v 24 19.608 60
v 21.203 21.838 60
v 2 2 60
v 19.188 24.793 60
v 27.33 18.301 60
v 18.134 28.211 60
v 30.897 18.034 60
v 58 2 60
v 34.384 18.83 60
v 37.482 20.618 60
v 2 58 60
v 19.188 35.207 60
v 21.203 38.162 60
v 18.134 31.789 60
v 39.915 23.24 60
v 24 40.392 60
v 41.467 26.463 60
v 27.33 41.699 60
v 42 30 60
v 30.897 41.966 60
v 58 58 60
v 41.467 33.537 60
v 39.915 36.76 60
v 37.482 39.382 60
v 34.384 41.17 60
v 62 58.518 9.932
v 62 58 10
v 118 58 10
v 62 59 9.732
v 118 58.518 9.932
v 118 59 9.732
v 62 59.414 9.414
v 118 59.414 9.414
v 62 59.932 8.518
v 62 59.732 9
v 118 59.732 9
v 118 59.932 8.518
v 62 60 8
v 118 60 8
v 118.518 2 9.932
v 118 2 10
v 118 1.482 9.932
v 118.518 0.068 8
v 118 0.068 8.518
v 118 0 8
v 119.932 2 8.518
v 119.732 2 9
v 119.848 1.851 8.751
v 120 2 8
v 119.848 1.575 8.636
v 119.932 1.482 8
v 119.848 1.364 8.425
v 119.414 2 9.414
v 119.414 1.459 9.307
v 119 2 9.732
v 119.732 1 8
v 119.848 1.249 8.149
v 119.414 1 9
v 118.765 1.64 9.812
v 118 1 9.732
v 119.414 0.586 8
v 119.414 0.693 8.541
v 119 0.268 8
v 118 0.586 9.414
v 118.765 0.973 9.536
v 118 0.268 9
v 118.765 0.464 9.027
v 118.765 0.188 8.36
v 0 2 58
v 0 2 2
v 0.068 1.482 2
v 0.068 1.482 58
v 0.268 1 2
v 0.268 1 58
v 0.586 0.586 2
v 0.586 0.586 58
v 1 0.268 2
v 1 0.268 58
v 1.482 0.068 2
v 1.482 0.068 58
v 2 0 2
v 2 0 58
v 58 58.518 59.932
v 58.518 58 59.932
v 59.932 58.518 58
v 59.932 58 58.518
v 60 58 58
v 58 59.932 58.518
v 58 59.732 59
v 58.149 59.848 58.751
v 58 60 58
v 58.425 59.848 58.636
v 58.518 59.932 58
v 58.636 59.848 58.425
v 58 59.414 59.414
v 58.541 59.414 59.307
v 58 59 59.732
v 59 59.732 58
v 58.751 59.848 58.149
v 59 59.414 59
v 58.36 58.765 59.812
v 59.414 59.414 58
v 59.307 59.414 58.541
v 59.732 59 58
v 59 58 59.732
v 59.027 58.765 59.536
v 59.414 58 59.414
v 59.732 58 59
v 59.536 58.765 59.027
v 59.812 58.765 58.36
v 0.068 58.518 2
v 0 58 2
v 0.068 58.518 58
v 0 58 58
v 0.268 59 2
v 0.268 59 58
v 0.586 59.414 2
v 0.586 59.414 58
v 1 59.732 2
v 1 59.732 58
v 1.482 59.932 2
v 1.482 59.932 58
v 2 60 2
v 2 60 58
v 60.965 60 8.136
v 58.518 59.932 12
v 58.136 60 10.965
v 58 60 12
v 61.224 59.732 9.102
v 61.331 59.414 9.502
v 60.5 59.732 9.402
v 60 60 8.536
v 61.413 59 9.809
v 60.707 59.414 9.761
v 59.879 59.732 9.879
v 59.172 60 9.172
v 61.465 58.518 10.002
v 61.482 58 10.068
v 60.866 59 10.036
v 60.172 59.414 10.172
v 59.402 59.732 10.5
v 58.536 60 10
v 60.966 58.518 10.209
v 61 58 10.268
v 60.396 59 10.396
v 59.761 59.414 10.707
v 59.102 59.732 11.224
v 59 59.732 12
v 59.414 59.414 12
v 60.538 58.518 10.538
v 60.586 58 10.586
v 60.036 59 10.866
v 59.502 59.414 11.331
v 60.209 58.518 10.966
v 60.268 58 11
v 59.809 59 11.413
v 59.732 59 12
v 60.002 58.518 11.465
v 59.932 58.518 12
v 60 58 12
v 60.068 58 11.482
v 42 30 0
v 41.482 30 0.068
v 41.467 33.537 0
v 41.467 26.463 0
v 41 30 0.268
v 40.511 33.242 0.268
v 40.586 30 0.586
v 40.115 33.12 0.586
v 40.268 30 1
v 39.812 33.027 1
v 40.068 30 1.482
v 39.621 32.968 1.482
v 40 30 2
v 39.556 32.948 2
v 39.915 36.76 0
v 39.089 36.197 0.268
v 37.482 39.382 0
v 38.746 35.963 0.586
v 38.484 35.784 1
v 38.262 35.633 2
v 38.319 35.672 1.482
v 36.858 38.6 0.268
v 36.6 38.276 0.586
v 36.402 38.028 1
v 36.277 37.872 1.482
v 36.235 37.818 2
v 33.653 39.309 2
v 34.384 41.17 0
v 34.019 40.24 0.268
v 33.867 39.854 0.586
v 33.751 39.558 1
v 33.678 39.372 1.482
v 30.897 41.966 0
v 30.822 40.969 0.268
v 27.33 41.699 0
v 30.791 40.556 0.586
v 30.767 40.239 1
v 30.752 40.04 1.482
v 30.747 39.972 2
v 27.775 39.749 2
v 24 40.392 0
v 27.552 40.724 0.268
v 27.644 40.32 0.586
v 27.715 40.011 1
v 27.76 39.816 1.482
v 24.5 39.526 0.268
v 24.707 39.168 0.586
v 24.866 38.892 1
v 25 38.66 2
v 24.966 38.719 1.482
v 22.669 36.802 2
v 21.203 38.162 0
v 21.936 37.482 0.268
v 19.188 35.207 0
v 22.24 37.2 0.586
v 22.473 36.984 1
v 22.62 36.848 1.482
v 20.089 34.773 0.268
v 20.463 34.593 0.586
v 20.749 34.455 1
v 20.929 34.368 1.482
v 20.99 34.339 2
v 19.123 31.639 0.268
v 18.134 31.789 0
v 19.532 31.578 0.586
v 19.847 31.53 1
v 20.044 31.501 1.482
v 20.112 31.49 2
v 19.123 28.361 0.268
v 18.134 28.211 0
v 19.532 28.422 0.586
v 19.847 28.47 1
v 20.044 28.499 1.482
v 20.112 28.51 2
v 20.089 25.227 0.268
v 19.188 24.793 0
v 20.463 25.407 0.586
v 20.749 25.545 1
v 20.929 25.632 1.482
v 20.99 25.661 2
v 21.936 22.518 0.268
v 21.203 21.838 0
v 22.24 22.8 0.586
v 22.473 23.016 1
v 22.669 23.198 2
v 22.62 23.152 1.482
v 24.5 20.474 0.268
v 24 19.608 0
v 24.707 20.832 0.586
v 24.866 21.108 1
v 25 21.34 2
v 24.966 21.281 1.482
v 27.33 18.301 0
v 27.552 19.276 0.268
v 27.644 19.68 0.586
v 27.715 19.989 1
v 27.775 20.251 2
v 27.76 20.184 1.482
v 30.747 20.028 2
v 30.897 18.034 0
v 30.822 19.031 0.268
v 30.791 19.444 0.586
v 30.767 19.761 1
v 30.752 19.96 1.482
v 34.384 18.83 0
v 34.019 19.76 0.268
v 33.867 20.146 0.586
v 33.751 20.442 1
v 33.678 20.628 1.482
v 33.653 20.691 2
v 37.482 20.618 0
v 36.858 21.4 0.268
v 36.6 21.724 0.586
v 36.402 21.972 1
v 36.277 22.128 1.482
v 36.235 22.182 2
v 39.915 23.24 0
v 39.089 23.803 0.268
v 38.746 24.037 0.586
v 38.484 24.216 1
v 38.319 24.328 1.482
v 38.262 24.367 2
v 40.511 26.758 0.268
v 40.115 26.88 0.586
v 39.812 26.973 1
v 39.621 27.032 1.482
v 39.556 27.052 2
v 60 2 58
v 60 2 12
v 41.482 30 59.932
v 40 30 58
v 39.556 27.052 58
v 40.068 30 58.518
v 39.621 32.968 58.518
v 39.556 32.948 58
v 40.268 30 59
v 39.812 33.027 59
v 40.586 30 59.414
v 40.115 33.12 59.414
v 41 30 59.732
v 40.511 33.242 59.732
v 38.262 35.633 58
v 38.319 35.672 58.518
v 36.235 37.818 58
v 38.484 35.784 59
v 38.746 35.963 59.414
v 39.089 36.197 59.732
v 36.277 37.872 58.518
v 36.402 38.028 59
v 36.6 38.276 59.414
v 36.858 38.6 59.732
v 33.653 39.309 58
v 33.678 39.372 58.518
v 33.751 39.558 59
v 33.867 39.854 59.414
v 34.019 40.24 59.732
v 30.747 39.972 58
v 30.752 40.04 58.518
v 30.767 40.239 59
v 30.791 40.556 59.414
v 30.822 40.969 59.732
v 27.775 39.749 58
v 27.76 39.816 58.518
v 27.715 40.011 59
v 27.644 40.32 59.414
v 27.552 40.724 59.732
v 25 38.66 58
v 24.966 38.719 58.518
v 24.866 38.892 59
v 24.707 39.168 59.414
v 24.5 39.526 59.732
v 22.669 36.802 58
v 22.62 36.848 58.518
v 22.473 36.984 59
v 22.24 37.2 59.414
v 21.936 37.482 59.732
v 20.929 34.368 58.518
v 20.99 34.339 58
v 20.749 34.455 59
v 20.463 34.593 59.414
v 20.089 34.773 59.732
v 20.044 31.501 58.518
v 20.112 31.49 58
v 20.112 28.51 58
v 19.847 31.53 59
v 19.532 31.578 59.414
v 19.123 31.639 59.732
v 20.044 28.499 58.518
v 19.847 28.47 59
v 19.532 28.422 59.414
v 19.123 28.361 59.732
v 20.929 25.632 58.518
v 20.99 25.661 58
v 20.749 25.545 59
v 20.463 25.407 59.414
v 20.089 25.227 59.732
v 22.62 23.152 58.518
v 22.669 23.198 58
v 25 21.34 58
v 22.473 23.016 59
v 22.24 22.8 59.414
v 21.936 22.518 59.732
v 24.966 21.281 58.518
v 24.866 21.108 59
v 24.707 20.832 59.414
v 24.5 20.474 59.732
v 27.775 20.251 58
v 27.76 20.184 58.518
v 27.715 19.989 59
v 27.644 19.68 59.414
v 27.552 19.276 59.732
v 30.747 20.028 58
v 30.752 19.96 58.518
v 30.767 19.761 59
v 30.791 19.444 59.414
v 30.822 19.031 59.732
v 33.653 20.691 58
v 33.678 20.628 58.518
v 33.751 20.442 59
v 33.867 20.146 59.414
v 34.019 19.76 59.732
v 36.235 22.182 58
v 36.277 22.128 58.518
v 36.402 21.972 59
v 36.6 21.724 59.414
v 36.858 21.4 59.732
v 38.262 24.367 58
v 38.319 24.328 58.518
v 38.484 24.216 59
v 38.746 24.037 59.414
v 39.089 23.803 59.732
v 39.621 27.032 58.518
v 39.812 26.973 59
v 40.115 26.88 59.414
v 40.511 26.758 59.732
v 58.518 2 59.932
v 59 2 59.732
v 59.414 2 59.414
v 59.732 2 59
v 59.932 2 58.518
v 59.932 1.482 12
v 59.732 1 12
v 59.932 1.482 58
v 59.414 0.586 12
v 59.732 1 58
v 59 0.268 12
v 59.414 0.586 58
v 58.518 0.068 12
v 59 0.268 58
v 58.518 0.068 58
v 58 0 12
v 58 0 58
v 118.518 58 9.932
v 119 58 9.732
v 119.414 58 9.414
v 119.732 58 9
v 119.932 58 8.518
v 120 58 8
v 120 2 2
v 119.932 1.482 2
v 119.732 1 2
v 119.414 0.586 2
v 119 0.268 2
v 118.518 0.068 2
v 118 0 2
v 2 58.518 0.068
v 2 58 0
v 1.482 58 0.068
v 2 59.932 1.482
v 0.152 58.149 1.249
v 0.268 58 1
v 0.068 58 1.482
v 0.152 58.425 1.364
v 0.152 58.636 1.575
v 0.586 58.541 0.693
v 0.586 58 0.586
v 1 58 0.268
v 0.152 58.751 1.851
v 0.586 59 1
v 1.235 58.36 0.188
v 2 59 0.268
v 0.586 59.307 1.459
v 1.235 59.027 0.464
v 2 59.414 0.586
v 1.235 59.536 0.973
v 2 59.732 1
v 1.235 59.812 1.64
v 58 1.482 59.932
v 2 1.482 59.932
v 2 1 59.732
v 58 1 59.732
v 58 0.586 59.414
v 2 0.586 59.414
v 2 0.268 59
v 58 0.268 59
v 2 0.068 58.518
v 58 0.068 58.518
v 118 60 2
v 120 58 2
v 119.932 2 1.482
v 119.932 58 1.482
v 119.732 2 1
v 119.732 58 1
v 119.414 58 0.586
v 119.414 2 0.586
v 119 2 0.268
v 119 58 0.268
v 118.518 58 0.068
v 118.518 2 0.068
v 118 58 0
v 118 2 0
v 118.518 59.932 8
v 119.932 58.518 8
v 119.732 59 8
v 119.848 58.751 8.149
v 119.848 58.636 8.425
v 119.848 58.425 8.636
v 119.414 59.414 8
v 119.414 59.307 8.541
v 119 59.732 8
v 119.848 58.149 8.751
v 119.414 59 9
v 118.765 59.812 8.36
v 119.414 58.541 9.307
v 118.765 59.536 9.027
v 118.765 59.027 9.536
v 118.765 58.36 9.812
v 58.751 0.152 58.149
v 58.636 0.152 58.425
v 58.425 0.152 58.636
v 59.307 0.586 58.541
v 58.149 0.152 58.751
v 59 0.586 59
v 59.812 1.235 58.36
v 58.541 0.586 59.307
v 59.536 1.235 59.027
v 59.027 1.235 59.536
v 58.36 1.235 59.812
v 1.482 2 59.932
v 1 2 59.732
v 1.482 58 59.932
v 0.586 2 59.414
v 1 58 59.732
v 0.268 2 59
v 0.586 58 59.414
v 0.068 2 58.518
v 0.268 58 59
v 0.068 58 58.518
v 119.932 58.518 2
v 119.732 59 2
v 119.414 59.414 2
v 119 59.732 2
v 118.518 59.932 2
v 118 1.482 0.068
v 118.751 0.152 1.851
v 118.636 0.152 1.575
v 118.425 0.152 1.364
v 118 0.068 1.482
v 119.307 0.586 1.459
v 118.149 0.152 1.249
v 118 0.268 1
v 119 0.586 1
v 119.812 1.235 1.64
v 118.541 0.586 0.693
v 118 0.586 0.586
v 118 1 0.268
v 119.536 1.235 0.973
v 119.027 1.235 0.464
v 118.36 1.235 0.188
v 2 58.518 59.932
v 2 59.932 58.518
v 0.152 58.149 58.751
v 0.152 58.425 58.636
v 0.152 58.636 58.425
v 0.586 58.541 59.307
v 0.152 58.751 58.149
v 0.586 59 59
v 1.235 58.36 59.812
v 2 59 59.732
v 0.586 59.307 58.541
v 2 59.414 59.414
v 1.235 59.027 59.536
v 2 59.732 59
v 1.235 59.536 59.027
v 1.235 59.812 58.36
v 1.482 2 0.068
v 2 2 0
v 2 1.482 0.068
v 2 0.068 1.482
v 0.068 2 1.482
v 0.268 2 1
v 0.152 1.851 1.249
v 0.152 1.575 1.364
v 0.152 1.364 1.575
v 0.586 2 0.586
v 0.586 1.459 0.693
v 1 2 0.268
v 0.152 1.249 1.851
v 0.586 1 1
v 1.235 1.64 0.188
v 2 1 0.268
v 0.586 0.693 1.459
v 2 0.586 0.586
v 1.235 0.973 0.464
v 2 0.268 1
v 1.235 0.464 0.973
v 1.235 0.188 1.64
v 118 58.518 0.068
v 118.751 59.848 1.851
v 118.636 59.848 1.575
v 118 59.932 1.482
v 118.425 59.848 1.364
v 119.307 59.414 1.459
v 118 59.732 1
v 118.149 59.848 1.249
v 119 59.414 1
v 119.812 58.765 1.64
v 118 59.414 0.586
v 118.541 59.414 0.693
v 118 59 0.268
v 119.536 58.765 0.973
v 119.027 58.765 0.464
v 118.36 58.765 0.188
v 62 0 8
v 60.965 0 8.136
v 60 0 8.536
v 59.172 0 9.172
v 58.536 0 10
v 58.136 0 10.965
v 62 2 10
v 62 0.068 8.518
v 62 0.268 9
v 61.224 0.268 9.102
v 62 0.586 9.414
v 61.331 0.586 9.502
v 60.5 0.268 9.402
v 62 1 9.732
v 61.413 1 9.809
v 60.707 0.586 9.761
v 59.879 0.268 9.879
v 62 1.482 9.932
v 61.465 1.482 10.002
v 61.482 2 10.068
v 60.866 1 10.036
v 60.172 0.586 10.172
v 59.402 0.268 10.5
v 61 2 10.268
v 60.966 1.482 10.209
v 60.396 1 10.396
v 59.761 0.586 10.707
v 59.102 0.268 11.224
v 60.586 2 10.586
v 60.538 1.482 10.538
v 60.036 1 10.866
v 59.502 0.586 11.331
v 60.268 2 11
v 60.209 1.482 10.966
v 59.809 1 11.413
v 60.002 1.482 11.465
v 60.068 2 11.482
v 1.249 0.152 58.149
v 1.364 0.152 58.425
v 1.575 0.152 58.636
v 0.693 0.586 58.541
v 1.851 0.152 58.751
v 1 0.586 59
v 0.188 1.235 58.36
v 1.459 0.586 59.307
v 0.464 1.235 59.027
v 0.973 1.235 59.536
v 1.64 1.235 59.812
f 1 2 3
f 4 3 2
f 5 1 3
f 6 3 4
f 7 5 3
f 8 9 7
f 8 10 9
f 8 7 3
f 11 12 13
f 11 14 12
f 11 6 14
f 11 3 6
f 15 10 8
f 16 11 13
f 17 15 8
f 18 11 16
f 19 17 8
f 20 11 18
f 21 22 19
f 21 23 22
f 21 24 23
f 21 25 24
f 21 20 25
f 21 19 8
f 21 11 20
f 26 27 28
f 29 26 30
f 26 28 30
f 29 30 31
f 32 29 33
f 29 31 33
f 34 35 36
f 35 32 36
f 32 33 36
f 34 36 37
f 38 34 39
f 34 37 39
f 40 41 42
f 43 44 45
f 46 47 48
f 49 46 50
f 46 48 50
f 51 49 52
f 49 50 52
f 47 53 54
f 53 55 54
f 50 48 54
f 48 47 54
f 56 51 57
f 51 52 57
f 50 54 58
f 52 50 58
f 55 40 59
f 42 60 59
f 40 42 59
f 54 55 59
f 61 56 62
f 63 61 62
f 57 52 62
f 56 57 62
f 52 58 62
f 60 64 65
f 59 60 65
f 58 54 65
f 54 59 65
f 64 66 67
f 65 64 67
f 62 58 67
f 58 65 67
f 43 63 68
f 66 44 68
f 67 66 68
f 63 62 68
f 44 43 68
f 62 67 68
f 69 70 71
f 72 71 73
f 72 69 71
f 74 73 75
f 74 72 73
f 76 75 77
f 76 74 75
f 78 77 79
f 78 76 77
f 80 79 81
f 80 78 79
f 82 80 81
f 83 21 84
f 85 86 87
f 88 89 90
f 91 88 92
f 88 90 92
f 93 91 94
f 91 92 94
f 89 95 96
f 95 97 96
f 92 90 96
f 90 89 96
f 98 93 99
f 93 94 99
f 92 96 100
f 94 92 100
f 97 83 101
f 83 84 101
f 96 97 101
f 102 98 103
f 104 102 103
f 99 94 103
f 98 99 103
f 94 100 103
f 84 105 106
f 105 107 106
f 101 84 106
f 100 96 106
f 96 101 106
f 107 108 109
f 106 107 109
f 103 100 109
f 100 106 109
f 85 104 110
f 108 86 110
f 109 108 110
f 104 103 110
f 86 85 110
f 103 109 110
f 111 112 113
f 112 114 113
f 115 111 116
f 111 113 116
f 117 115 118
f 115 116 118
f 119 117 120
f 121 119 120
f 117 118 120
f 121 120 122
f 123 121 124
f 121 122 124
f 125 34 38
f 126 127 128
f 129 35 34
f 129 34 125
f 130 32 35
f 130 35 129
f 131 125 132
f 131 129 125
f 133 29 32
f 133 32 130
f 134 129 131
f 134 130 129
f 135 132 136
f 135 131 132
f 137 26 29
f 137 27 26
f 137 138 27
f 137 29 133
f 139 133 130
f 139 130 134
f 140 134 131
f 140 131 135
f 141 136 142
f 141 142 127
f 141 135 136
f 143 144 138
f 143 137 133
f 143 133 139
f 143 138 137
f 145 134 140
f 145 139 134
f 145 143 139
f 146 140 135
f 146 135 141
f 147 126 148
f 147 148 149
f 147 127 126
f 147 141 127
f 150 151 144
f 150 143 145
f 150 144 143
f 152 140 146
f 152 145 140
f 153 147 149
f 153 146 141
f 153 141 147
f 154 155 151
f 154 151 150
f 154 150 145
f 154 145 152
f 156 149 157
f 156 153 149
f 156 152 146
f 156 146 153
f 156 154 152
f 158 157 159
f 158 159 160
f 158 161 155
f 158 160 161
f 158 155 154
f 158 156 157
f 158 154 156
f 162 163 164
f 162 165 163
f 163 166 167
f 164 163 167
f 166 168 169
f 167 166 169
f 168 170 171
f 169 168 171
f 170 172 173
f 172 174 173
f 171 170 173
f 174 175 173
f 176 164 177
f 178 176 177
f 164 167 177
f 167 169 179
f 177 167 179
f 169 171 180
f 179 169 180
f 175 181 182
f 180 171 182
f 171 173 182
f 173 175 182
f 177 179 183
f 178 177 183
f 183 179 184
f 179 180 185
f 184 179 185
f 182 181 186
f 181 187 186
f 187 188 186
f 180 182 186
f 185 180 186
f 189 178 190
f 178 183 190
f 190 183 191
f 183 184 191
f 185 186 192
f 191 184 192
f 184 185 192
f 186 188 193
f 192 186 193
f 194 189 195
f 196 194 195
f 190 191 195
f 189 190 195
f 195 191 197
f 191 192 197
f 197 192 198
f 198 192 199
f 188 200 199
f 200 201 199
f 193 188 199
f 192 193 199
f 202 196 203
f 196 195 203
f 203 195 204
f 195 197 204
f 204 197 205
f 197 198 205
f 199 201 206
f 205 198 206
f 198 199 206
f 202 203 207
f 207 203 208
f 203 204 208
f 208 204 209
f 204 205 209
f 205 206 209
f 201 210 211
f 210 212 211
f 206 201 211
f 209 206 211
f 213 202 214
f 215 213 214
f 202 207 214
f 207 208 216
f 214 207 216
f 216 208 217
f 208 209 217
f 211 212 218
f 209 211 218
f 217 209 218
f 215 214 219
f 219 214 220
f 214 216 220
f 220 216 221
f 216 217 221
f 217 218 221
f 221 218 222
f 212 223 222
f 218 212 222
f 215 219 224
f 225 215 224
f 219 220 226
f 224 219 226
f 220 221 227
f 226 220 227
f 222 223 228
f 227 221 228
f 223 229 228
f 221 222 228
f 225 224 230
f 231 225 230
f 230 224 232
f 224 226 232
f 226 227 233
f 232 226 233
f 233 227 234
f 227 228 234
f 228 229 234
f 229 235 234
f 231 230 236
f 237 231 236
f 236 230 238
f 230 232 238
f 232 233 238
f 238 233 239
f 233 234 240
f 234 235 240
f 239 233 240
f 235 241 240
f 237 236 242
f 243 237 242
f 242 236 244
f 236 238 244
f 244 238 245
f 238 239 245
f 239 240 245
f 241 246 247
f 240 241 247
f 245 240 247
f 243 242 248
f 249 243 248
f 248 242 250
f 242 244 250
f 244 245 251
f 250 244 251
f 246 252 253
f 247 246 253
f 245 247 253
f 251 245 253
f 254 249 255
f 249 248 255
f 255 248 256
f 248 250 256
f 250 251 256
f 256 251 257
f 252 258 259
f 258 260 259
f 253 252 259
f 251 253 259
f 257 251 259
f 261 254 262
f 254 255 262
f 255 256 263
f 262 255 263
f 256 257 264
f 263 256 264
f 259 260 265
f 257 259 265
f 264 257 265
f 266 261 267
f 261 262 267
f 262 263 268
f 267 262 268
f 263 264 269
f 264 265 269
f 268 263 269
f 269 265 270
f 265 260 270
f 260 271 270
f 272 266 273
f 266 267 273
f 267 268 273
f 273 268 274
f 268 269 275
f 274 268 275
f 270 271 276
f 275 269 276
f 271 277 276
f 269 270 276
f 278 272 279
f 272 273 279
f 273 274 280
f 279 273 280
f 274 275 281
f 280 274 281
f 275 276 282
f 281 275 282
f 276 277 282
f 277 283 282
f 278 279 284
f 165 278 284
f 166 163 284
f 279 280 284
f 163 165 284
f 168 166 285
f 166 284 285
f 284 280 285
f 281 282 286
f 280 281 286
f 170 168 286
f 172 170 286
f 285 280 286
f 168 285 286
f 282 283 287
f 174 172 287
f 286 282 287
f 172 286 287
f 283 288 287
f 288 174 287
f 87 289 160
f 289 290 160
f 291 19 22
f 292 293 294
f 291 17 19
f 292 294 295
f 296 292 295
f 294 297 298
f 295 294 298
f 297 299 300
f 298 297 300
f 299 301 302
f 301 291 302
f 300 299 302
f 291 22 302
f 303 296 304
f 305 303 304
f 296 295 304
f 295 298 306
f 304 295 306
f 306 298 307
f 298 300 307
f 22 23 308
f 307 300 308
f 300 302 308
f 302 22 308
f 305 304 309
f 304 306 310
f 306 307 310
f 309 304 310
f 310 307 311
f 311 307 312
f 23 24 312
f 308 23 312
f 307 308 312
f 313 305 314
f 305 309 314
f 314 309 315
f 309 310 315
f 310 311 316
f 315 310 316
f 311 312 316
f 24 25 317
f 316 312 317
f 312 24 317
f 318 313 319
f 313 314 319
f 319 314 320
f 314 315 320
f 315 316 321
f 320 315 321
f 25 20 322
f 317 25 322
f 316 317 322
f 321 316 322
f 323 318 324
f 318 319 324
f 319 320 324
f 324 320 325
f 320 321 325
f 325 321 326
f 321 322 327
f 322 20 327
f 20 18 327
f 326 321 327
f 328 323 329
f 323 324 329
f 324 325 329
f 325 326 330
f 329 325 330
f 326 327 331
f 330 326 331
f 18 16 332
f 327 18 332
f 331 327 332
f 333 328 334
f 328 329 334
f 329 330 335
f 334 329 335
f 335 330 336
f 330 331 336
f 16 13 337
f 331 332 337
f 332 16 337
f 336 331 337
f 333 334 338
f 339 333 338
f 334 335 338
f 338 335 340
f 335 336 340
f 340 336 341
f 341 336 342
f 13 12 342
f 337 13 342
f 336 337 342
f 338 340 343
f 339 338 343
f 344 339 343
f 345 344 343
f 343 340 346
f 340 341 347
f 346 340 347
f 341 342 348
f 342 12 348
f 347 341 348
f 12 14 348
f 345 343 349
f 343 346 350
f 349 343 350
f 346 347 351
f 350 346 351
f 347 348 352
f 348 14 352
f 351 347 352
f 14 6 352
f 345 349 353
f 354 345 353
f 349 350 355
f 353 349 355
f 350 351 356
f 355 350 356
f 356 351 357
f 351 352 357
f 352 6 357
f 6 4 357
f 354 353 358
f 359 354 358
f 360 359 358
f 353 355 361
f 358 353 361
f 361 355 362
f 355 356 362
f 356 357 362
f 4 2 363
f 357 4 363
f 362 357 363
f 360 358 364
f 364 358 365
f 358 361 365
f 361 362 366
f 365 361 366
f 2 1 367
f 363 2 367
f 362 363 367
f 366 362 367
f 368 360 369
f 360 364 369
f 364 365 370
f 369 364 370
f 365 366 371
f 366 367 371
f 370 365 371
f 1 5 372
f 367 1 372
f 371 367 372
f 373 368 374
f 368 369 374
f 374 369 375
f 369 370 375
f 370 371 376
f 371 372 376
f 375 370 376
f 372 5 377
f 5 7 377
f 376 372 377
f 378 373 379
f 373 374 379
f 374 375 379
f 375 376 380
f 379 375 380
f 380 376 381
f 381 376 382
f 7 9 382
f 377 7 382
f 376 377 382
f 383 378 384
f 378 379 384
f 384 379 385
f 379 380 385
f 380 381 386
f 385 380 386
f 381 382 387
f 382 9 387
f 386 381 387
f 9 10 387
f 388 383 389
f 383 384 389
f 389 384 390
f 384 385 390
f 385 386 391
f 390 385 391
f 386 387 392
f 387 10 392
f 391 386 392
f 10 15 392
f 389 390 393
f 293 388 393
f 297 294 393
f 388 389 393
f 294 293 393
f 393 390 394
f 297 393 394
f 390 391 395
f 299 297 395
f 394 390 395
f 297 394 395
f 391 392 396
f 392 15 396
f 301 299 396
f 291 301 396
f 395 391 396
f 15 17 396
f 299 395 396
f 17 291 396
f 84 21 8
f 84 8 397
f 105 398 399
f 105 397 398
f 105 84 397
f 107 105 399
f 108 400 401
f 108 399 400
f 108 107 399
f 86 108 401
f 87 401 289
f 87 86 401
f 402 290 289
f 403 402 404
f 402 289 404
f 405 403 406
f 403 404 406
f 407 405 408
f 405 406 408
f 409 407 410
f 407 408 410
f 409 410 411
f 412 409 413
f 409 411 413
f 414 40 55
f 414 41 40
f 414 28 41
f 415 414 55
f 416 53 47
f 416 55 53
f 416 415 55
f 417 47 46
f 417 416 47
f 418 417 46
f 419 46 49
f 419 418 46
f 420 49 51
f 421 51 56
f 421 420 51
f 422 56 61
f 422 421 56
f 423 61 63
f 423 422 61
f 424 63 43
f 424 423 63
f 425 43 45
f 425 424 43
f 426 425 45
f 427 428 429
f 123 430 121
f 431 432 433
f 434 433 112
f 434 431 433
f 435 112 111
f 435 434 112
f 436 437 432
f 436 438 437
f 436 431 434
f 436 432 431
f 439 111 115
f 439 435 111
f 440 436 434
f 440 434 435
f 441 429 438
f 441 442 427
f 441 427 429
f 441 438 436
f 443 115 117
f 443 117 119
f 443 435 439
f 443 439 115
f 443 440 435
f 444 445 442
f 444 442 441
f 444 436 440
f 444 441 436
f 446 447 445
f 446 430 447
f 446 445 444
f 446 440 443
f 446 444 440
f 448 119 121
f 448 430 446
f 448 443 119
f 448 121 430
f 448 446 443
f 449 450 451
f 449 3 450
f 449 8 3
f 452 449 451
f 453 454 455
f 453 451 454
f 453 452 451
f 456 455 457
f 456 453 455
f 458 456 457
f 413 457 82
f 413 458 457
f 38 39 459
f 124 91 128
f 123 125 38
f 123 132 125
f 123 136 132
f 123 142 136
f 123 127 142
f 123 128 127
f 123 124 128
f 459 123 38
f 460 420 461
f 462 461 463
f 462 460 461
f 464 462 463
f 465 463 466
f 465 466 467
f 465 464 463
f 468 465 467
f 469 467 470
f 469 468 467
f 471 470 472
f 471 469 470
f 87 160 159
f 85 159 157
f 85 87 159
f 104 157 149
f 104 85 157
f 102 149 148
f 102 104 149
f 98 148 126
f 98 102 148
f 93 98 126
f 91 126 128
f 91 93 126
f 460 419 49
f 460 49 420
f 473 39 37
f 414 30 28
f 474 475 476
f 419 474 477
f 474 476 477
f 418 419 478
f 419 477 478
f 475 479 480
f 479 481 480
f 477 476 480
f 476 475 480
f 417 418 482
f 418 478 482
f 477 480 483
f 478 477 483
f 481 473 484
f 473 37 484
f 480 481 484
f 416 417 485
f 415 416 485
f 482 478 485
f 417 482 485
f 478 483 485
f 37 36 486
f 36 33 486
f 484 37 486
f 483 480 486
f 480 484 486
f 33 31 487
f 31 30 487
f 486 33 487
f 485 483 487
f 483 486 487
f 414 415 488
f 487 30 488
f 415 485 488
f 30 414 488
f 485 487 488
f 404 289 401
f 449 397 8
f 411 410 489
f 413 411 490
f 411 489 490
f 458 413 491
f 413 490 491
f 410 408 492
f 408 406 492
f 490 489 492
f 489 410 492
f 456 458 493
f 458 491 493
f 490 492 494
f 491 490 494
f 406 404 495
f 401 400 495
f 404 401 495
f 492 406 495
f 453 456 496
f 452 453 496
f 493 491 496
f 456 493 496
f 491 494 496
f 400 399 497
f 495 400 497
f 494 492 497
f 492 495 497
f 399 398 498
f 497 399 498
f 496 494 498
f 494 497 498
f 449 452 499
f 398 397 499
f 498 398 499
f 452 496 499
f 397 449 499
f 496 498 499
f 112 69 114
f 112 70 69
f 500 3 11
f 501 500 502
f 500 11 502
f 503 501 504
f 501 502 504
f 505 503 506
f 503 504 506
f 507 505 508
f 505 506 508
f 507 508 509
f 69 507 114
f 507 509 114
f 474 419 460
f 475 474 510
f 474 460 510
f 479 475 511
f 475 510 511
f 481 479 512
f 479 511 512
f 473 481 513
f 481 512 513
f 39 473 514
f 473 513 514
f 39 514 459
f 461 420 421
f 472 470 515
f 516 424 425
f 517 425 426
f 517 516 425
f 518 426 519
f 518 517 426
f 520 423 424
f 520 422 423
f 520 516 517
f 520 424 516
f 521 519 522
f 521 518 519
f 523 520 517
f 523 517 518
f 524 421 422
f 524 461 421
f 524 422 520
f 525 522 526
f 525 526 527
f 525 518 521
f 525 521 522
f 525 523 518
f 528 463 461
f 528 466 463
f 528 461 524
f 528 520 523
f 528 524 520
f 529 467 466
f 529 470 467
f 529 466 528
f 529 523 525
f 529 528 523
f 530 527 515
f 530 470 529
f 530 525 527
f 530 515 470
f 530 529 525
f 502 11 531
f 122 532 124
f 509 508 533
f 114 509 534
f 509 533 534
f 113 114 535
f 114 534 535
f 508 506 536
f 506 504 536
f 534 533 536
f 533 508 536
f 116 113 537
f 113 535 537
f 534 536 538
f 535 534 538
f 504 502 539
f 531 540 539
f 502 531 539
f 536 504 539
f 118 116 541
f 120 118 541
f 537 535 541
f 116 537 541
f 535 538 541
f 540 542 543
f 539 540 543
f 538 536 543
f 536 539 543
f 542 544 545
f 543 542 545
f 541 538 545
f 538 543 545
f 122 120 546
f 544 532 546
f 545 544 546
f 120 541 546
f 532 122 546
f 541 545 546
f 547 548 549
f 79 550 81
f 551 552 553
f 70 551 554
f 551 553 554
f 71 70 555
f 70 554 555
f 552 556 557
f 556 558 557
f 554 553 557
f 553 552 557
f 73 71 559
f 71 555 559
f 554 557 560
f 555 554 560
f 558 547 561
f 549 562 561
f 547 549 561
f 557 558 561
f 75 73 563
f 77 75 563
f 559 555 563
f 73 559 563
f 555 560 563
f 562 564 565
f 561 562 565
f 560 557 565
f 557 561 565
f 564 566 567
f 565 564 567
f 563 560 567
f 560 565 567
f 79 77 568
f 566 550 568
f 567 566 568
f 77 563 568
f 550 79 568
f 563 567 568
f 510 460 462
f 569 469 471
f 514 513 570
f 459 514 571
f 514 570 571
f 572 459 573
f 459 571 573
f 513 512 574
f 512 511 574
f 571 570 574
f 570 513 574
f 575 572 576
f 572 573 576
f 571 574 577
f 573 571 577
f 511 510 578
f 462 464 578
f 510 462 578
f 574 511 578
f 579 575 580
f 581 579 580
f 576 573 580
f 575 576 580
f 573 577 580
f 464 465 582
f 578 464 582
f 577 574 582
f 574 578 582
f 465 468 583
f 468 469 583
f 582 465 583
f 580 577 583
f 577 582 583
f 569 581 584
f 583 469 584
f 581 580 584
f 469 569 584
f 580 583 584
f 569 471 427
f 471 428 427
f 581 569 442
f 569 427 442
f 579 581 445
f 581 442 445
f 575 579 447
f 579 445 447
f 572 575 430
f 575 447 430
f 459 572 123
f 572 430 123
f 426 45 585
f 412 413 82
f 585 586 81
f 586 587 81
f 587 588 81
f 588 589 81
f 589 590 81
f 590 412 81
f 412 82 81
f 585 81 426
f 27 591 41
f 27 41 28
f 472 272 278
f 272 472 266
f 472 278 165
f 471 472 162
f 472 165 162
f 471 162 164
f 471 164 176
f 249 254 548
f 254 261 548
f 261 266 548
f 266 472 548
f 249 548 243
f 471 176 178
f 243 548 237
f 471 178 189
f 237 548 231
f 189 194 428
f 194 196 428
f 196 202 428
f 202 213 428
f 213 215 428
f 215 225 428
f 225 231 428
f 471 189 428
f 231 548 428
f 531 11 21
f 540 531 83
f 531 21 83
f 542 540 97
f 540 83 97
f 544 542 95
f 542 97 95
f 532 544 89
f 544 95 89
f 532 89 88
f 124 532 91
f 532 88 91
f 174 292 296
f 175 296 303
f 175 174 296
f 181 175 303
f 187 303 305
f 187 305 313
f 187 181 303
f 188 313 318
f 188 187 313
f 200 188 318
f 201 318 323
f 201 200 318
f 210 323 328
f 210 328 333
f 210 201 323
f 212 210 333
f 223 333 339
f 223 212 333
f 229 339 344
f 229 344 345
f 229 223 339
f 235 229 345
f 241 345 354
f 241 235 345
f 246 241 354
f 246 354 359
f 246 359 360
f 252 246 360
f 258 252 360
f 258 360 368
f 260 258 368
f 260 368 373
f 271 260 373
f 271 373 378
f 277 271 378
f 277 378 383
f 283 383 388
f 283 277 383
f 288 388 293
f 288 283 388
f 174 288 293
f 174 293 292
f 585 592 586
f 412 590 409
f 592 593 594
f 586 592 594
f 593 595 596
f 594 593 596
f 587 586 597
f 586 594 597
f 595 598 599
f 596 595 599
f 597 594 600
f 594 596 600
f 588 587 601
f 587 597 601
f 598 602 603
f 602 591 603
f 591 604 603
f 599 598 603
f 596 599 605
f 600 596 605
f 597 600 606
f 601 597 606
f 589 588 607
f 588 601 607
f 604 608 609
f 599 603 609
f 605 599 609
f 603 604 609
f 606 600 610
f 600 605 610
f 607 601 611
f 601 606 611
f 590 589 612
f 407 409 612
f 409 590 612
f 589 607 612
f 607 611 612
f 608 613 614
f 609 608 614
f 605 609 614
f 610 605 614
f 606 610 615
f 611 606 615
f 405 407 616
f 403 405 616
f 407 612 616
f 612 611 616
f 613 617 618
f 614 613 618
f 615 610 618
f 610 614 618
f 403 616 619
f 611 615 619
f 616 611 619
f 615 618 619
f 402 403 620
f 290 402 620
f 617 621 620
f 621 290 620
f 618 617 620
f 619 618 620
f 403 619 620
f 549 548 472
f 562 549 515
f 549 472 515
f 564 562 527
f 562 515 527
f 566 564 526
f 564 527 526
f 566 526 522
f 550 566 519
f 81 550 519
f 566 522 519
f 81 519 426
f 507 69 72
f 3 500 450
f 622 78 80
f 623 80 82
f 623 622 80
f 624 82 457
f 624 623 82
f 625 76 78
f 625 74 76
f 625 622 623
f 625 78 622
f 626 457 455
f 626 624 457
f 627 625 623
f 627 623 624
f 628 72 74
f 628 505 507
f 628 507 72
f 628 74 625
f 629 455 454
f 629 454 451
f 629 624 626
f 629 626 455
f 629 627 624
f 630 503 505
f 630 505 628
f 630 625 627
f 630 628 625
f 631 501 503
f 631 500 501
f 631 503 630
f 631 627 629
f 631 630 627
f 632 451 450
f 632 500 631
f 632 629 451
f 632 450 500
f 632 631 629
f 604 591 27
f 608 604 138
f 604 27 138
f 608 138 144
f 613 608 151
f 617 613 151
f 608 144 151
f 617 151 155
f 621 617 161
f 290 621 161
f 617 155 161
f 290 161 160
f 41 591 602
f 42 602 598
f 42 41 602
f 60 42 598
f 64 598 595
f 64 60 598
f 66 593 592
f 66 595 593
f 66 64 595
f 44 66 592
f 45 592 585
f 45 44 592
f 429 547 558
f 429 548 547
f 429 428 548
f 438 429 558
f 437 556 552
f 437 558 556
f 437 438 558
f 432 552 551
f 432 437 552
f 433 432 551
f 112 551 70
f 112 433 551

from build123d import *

# Parameters (mm, degrees)
SKETCH1_W           = 60
SKETCH1_H           = 60
SKETCH1_R           = 10
BOSS_EXTRUDE1_DEPTH = 60
SKETCH2_W           = 10
SKETCH2_H           = 60
BOSS_EXTRUDE2_DEPTH = 60
FILLET1_R           = 2


with BuildPart() as part:
    # Sketch1 → Boss-Extrude1 (new body)
    with BuildSketch(Plane.XY):
        with Locations((30, 30)):
            Rectangle(SKETCH1_W, SKETCH1_H)
        with Locations((30, 30)):
            Circle(SKETCH1_R, mode=Mode.SUBTRACT)
    extrude(amount=BOSS_EXTRUDE1_DEPTH)

    # Sketch2 → Boss-Extrude2 (add)
    with BuildSketch(Plane(origin=(60, 0, 0), x_dir=(0, 0, -1), z_dir=(1, 0, 0))):
        with Locations((-5, 30)):
            Rectangle(SKETCH2_W, SKETCH2_H)
    extrude(amount=BOSS_EXTRUDE2_DEPTH)

    # Fillet1
    fillet1_edges = [part.edges().sort_by_distance(p)[0] for p in [
        (20, 30, 0),
        (20, 30, 60),
        (60, 30, 60),
        (30, 60, 60),
        (60, 30, 10),
        (90, 60, 10),
        (90, 0, 10),
        (120, 30, 0),
        (120, 60, 5),
        (120, 30, 10),
        (120, 0, 5),
        (0, 30, 60),
        (60, 60, 0),
        (60, 0, 0),
        (0, 30, 0),
        (0, 60, 30),
        (60, 60, 35),
        (60, 0, 35),
        (0, 0, 30),
        (30, 0, 60),
    ]]
    fillet(fillet1_edges, radius=FILLET1_R)


solid = part.part
